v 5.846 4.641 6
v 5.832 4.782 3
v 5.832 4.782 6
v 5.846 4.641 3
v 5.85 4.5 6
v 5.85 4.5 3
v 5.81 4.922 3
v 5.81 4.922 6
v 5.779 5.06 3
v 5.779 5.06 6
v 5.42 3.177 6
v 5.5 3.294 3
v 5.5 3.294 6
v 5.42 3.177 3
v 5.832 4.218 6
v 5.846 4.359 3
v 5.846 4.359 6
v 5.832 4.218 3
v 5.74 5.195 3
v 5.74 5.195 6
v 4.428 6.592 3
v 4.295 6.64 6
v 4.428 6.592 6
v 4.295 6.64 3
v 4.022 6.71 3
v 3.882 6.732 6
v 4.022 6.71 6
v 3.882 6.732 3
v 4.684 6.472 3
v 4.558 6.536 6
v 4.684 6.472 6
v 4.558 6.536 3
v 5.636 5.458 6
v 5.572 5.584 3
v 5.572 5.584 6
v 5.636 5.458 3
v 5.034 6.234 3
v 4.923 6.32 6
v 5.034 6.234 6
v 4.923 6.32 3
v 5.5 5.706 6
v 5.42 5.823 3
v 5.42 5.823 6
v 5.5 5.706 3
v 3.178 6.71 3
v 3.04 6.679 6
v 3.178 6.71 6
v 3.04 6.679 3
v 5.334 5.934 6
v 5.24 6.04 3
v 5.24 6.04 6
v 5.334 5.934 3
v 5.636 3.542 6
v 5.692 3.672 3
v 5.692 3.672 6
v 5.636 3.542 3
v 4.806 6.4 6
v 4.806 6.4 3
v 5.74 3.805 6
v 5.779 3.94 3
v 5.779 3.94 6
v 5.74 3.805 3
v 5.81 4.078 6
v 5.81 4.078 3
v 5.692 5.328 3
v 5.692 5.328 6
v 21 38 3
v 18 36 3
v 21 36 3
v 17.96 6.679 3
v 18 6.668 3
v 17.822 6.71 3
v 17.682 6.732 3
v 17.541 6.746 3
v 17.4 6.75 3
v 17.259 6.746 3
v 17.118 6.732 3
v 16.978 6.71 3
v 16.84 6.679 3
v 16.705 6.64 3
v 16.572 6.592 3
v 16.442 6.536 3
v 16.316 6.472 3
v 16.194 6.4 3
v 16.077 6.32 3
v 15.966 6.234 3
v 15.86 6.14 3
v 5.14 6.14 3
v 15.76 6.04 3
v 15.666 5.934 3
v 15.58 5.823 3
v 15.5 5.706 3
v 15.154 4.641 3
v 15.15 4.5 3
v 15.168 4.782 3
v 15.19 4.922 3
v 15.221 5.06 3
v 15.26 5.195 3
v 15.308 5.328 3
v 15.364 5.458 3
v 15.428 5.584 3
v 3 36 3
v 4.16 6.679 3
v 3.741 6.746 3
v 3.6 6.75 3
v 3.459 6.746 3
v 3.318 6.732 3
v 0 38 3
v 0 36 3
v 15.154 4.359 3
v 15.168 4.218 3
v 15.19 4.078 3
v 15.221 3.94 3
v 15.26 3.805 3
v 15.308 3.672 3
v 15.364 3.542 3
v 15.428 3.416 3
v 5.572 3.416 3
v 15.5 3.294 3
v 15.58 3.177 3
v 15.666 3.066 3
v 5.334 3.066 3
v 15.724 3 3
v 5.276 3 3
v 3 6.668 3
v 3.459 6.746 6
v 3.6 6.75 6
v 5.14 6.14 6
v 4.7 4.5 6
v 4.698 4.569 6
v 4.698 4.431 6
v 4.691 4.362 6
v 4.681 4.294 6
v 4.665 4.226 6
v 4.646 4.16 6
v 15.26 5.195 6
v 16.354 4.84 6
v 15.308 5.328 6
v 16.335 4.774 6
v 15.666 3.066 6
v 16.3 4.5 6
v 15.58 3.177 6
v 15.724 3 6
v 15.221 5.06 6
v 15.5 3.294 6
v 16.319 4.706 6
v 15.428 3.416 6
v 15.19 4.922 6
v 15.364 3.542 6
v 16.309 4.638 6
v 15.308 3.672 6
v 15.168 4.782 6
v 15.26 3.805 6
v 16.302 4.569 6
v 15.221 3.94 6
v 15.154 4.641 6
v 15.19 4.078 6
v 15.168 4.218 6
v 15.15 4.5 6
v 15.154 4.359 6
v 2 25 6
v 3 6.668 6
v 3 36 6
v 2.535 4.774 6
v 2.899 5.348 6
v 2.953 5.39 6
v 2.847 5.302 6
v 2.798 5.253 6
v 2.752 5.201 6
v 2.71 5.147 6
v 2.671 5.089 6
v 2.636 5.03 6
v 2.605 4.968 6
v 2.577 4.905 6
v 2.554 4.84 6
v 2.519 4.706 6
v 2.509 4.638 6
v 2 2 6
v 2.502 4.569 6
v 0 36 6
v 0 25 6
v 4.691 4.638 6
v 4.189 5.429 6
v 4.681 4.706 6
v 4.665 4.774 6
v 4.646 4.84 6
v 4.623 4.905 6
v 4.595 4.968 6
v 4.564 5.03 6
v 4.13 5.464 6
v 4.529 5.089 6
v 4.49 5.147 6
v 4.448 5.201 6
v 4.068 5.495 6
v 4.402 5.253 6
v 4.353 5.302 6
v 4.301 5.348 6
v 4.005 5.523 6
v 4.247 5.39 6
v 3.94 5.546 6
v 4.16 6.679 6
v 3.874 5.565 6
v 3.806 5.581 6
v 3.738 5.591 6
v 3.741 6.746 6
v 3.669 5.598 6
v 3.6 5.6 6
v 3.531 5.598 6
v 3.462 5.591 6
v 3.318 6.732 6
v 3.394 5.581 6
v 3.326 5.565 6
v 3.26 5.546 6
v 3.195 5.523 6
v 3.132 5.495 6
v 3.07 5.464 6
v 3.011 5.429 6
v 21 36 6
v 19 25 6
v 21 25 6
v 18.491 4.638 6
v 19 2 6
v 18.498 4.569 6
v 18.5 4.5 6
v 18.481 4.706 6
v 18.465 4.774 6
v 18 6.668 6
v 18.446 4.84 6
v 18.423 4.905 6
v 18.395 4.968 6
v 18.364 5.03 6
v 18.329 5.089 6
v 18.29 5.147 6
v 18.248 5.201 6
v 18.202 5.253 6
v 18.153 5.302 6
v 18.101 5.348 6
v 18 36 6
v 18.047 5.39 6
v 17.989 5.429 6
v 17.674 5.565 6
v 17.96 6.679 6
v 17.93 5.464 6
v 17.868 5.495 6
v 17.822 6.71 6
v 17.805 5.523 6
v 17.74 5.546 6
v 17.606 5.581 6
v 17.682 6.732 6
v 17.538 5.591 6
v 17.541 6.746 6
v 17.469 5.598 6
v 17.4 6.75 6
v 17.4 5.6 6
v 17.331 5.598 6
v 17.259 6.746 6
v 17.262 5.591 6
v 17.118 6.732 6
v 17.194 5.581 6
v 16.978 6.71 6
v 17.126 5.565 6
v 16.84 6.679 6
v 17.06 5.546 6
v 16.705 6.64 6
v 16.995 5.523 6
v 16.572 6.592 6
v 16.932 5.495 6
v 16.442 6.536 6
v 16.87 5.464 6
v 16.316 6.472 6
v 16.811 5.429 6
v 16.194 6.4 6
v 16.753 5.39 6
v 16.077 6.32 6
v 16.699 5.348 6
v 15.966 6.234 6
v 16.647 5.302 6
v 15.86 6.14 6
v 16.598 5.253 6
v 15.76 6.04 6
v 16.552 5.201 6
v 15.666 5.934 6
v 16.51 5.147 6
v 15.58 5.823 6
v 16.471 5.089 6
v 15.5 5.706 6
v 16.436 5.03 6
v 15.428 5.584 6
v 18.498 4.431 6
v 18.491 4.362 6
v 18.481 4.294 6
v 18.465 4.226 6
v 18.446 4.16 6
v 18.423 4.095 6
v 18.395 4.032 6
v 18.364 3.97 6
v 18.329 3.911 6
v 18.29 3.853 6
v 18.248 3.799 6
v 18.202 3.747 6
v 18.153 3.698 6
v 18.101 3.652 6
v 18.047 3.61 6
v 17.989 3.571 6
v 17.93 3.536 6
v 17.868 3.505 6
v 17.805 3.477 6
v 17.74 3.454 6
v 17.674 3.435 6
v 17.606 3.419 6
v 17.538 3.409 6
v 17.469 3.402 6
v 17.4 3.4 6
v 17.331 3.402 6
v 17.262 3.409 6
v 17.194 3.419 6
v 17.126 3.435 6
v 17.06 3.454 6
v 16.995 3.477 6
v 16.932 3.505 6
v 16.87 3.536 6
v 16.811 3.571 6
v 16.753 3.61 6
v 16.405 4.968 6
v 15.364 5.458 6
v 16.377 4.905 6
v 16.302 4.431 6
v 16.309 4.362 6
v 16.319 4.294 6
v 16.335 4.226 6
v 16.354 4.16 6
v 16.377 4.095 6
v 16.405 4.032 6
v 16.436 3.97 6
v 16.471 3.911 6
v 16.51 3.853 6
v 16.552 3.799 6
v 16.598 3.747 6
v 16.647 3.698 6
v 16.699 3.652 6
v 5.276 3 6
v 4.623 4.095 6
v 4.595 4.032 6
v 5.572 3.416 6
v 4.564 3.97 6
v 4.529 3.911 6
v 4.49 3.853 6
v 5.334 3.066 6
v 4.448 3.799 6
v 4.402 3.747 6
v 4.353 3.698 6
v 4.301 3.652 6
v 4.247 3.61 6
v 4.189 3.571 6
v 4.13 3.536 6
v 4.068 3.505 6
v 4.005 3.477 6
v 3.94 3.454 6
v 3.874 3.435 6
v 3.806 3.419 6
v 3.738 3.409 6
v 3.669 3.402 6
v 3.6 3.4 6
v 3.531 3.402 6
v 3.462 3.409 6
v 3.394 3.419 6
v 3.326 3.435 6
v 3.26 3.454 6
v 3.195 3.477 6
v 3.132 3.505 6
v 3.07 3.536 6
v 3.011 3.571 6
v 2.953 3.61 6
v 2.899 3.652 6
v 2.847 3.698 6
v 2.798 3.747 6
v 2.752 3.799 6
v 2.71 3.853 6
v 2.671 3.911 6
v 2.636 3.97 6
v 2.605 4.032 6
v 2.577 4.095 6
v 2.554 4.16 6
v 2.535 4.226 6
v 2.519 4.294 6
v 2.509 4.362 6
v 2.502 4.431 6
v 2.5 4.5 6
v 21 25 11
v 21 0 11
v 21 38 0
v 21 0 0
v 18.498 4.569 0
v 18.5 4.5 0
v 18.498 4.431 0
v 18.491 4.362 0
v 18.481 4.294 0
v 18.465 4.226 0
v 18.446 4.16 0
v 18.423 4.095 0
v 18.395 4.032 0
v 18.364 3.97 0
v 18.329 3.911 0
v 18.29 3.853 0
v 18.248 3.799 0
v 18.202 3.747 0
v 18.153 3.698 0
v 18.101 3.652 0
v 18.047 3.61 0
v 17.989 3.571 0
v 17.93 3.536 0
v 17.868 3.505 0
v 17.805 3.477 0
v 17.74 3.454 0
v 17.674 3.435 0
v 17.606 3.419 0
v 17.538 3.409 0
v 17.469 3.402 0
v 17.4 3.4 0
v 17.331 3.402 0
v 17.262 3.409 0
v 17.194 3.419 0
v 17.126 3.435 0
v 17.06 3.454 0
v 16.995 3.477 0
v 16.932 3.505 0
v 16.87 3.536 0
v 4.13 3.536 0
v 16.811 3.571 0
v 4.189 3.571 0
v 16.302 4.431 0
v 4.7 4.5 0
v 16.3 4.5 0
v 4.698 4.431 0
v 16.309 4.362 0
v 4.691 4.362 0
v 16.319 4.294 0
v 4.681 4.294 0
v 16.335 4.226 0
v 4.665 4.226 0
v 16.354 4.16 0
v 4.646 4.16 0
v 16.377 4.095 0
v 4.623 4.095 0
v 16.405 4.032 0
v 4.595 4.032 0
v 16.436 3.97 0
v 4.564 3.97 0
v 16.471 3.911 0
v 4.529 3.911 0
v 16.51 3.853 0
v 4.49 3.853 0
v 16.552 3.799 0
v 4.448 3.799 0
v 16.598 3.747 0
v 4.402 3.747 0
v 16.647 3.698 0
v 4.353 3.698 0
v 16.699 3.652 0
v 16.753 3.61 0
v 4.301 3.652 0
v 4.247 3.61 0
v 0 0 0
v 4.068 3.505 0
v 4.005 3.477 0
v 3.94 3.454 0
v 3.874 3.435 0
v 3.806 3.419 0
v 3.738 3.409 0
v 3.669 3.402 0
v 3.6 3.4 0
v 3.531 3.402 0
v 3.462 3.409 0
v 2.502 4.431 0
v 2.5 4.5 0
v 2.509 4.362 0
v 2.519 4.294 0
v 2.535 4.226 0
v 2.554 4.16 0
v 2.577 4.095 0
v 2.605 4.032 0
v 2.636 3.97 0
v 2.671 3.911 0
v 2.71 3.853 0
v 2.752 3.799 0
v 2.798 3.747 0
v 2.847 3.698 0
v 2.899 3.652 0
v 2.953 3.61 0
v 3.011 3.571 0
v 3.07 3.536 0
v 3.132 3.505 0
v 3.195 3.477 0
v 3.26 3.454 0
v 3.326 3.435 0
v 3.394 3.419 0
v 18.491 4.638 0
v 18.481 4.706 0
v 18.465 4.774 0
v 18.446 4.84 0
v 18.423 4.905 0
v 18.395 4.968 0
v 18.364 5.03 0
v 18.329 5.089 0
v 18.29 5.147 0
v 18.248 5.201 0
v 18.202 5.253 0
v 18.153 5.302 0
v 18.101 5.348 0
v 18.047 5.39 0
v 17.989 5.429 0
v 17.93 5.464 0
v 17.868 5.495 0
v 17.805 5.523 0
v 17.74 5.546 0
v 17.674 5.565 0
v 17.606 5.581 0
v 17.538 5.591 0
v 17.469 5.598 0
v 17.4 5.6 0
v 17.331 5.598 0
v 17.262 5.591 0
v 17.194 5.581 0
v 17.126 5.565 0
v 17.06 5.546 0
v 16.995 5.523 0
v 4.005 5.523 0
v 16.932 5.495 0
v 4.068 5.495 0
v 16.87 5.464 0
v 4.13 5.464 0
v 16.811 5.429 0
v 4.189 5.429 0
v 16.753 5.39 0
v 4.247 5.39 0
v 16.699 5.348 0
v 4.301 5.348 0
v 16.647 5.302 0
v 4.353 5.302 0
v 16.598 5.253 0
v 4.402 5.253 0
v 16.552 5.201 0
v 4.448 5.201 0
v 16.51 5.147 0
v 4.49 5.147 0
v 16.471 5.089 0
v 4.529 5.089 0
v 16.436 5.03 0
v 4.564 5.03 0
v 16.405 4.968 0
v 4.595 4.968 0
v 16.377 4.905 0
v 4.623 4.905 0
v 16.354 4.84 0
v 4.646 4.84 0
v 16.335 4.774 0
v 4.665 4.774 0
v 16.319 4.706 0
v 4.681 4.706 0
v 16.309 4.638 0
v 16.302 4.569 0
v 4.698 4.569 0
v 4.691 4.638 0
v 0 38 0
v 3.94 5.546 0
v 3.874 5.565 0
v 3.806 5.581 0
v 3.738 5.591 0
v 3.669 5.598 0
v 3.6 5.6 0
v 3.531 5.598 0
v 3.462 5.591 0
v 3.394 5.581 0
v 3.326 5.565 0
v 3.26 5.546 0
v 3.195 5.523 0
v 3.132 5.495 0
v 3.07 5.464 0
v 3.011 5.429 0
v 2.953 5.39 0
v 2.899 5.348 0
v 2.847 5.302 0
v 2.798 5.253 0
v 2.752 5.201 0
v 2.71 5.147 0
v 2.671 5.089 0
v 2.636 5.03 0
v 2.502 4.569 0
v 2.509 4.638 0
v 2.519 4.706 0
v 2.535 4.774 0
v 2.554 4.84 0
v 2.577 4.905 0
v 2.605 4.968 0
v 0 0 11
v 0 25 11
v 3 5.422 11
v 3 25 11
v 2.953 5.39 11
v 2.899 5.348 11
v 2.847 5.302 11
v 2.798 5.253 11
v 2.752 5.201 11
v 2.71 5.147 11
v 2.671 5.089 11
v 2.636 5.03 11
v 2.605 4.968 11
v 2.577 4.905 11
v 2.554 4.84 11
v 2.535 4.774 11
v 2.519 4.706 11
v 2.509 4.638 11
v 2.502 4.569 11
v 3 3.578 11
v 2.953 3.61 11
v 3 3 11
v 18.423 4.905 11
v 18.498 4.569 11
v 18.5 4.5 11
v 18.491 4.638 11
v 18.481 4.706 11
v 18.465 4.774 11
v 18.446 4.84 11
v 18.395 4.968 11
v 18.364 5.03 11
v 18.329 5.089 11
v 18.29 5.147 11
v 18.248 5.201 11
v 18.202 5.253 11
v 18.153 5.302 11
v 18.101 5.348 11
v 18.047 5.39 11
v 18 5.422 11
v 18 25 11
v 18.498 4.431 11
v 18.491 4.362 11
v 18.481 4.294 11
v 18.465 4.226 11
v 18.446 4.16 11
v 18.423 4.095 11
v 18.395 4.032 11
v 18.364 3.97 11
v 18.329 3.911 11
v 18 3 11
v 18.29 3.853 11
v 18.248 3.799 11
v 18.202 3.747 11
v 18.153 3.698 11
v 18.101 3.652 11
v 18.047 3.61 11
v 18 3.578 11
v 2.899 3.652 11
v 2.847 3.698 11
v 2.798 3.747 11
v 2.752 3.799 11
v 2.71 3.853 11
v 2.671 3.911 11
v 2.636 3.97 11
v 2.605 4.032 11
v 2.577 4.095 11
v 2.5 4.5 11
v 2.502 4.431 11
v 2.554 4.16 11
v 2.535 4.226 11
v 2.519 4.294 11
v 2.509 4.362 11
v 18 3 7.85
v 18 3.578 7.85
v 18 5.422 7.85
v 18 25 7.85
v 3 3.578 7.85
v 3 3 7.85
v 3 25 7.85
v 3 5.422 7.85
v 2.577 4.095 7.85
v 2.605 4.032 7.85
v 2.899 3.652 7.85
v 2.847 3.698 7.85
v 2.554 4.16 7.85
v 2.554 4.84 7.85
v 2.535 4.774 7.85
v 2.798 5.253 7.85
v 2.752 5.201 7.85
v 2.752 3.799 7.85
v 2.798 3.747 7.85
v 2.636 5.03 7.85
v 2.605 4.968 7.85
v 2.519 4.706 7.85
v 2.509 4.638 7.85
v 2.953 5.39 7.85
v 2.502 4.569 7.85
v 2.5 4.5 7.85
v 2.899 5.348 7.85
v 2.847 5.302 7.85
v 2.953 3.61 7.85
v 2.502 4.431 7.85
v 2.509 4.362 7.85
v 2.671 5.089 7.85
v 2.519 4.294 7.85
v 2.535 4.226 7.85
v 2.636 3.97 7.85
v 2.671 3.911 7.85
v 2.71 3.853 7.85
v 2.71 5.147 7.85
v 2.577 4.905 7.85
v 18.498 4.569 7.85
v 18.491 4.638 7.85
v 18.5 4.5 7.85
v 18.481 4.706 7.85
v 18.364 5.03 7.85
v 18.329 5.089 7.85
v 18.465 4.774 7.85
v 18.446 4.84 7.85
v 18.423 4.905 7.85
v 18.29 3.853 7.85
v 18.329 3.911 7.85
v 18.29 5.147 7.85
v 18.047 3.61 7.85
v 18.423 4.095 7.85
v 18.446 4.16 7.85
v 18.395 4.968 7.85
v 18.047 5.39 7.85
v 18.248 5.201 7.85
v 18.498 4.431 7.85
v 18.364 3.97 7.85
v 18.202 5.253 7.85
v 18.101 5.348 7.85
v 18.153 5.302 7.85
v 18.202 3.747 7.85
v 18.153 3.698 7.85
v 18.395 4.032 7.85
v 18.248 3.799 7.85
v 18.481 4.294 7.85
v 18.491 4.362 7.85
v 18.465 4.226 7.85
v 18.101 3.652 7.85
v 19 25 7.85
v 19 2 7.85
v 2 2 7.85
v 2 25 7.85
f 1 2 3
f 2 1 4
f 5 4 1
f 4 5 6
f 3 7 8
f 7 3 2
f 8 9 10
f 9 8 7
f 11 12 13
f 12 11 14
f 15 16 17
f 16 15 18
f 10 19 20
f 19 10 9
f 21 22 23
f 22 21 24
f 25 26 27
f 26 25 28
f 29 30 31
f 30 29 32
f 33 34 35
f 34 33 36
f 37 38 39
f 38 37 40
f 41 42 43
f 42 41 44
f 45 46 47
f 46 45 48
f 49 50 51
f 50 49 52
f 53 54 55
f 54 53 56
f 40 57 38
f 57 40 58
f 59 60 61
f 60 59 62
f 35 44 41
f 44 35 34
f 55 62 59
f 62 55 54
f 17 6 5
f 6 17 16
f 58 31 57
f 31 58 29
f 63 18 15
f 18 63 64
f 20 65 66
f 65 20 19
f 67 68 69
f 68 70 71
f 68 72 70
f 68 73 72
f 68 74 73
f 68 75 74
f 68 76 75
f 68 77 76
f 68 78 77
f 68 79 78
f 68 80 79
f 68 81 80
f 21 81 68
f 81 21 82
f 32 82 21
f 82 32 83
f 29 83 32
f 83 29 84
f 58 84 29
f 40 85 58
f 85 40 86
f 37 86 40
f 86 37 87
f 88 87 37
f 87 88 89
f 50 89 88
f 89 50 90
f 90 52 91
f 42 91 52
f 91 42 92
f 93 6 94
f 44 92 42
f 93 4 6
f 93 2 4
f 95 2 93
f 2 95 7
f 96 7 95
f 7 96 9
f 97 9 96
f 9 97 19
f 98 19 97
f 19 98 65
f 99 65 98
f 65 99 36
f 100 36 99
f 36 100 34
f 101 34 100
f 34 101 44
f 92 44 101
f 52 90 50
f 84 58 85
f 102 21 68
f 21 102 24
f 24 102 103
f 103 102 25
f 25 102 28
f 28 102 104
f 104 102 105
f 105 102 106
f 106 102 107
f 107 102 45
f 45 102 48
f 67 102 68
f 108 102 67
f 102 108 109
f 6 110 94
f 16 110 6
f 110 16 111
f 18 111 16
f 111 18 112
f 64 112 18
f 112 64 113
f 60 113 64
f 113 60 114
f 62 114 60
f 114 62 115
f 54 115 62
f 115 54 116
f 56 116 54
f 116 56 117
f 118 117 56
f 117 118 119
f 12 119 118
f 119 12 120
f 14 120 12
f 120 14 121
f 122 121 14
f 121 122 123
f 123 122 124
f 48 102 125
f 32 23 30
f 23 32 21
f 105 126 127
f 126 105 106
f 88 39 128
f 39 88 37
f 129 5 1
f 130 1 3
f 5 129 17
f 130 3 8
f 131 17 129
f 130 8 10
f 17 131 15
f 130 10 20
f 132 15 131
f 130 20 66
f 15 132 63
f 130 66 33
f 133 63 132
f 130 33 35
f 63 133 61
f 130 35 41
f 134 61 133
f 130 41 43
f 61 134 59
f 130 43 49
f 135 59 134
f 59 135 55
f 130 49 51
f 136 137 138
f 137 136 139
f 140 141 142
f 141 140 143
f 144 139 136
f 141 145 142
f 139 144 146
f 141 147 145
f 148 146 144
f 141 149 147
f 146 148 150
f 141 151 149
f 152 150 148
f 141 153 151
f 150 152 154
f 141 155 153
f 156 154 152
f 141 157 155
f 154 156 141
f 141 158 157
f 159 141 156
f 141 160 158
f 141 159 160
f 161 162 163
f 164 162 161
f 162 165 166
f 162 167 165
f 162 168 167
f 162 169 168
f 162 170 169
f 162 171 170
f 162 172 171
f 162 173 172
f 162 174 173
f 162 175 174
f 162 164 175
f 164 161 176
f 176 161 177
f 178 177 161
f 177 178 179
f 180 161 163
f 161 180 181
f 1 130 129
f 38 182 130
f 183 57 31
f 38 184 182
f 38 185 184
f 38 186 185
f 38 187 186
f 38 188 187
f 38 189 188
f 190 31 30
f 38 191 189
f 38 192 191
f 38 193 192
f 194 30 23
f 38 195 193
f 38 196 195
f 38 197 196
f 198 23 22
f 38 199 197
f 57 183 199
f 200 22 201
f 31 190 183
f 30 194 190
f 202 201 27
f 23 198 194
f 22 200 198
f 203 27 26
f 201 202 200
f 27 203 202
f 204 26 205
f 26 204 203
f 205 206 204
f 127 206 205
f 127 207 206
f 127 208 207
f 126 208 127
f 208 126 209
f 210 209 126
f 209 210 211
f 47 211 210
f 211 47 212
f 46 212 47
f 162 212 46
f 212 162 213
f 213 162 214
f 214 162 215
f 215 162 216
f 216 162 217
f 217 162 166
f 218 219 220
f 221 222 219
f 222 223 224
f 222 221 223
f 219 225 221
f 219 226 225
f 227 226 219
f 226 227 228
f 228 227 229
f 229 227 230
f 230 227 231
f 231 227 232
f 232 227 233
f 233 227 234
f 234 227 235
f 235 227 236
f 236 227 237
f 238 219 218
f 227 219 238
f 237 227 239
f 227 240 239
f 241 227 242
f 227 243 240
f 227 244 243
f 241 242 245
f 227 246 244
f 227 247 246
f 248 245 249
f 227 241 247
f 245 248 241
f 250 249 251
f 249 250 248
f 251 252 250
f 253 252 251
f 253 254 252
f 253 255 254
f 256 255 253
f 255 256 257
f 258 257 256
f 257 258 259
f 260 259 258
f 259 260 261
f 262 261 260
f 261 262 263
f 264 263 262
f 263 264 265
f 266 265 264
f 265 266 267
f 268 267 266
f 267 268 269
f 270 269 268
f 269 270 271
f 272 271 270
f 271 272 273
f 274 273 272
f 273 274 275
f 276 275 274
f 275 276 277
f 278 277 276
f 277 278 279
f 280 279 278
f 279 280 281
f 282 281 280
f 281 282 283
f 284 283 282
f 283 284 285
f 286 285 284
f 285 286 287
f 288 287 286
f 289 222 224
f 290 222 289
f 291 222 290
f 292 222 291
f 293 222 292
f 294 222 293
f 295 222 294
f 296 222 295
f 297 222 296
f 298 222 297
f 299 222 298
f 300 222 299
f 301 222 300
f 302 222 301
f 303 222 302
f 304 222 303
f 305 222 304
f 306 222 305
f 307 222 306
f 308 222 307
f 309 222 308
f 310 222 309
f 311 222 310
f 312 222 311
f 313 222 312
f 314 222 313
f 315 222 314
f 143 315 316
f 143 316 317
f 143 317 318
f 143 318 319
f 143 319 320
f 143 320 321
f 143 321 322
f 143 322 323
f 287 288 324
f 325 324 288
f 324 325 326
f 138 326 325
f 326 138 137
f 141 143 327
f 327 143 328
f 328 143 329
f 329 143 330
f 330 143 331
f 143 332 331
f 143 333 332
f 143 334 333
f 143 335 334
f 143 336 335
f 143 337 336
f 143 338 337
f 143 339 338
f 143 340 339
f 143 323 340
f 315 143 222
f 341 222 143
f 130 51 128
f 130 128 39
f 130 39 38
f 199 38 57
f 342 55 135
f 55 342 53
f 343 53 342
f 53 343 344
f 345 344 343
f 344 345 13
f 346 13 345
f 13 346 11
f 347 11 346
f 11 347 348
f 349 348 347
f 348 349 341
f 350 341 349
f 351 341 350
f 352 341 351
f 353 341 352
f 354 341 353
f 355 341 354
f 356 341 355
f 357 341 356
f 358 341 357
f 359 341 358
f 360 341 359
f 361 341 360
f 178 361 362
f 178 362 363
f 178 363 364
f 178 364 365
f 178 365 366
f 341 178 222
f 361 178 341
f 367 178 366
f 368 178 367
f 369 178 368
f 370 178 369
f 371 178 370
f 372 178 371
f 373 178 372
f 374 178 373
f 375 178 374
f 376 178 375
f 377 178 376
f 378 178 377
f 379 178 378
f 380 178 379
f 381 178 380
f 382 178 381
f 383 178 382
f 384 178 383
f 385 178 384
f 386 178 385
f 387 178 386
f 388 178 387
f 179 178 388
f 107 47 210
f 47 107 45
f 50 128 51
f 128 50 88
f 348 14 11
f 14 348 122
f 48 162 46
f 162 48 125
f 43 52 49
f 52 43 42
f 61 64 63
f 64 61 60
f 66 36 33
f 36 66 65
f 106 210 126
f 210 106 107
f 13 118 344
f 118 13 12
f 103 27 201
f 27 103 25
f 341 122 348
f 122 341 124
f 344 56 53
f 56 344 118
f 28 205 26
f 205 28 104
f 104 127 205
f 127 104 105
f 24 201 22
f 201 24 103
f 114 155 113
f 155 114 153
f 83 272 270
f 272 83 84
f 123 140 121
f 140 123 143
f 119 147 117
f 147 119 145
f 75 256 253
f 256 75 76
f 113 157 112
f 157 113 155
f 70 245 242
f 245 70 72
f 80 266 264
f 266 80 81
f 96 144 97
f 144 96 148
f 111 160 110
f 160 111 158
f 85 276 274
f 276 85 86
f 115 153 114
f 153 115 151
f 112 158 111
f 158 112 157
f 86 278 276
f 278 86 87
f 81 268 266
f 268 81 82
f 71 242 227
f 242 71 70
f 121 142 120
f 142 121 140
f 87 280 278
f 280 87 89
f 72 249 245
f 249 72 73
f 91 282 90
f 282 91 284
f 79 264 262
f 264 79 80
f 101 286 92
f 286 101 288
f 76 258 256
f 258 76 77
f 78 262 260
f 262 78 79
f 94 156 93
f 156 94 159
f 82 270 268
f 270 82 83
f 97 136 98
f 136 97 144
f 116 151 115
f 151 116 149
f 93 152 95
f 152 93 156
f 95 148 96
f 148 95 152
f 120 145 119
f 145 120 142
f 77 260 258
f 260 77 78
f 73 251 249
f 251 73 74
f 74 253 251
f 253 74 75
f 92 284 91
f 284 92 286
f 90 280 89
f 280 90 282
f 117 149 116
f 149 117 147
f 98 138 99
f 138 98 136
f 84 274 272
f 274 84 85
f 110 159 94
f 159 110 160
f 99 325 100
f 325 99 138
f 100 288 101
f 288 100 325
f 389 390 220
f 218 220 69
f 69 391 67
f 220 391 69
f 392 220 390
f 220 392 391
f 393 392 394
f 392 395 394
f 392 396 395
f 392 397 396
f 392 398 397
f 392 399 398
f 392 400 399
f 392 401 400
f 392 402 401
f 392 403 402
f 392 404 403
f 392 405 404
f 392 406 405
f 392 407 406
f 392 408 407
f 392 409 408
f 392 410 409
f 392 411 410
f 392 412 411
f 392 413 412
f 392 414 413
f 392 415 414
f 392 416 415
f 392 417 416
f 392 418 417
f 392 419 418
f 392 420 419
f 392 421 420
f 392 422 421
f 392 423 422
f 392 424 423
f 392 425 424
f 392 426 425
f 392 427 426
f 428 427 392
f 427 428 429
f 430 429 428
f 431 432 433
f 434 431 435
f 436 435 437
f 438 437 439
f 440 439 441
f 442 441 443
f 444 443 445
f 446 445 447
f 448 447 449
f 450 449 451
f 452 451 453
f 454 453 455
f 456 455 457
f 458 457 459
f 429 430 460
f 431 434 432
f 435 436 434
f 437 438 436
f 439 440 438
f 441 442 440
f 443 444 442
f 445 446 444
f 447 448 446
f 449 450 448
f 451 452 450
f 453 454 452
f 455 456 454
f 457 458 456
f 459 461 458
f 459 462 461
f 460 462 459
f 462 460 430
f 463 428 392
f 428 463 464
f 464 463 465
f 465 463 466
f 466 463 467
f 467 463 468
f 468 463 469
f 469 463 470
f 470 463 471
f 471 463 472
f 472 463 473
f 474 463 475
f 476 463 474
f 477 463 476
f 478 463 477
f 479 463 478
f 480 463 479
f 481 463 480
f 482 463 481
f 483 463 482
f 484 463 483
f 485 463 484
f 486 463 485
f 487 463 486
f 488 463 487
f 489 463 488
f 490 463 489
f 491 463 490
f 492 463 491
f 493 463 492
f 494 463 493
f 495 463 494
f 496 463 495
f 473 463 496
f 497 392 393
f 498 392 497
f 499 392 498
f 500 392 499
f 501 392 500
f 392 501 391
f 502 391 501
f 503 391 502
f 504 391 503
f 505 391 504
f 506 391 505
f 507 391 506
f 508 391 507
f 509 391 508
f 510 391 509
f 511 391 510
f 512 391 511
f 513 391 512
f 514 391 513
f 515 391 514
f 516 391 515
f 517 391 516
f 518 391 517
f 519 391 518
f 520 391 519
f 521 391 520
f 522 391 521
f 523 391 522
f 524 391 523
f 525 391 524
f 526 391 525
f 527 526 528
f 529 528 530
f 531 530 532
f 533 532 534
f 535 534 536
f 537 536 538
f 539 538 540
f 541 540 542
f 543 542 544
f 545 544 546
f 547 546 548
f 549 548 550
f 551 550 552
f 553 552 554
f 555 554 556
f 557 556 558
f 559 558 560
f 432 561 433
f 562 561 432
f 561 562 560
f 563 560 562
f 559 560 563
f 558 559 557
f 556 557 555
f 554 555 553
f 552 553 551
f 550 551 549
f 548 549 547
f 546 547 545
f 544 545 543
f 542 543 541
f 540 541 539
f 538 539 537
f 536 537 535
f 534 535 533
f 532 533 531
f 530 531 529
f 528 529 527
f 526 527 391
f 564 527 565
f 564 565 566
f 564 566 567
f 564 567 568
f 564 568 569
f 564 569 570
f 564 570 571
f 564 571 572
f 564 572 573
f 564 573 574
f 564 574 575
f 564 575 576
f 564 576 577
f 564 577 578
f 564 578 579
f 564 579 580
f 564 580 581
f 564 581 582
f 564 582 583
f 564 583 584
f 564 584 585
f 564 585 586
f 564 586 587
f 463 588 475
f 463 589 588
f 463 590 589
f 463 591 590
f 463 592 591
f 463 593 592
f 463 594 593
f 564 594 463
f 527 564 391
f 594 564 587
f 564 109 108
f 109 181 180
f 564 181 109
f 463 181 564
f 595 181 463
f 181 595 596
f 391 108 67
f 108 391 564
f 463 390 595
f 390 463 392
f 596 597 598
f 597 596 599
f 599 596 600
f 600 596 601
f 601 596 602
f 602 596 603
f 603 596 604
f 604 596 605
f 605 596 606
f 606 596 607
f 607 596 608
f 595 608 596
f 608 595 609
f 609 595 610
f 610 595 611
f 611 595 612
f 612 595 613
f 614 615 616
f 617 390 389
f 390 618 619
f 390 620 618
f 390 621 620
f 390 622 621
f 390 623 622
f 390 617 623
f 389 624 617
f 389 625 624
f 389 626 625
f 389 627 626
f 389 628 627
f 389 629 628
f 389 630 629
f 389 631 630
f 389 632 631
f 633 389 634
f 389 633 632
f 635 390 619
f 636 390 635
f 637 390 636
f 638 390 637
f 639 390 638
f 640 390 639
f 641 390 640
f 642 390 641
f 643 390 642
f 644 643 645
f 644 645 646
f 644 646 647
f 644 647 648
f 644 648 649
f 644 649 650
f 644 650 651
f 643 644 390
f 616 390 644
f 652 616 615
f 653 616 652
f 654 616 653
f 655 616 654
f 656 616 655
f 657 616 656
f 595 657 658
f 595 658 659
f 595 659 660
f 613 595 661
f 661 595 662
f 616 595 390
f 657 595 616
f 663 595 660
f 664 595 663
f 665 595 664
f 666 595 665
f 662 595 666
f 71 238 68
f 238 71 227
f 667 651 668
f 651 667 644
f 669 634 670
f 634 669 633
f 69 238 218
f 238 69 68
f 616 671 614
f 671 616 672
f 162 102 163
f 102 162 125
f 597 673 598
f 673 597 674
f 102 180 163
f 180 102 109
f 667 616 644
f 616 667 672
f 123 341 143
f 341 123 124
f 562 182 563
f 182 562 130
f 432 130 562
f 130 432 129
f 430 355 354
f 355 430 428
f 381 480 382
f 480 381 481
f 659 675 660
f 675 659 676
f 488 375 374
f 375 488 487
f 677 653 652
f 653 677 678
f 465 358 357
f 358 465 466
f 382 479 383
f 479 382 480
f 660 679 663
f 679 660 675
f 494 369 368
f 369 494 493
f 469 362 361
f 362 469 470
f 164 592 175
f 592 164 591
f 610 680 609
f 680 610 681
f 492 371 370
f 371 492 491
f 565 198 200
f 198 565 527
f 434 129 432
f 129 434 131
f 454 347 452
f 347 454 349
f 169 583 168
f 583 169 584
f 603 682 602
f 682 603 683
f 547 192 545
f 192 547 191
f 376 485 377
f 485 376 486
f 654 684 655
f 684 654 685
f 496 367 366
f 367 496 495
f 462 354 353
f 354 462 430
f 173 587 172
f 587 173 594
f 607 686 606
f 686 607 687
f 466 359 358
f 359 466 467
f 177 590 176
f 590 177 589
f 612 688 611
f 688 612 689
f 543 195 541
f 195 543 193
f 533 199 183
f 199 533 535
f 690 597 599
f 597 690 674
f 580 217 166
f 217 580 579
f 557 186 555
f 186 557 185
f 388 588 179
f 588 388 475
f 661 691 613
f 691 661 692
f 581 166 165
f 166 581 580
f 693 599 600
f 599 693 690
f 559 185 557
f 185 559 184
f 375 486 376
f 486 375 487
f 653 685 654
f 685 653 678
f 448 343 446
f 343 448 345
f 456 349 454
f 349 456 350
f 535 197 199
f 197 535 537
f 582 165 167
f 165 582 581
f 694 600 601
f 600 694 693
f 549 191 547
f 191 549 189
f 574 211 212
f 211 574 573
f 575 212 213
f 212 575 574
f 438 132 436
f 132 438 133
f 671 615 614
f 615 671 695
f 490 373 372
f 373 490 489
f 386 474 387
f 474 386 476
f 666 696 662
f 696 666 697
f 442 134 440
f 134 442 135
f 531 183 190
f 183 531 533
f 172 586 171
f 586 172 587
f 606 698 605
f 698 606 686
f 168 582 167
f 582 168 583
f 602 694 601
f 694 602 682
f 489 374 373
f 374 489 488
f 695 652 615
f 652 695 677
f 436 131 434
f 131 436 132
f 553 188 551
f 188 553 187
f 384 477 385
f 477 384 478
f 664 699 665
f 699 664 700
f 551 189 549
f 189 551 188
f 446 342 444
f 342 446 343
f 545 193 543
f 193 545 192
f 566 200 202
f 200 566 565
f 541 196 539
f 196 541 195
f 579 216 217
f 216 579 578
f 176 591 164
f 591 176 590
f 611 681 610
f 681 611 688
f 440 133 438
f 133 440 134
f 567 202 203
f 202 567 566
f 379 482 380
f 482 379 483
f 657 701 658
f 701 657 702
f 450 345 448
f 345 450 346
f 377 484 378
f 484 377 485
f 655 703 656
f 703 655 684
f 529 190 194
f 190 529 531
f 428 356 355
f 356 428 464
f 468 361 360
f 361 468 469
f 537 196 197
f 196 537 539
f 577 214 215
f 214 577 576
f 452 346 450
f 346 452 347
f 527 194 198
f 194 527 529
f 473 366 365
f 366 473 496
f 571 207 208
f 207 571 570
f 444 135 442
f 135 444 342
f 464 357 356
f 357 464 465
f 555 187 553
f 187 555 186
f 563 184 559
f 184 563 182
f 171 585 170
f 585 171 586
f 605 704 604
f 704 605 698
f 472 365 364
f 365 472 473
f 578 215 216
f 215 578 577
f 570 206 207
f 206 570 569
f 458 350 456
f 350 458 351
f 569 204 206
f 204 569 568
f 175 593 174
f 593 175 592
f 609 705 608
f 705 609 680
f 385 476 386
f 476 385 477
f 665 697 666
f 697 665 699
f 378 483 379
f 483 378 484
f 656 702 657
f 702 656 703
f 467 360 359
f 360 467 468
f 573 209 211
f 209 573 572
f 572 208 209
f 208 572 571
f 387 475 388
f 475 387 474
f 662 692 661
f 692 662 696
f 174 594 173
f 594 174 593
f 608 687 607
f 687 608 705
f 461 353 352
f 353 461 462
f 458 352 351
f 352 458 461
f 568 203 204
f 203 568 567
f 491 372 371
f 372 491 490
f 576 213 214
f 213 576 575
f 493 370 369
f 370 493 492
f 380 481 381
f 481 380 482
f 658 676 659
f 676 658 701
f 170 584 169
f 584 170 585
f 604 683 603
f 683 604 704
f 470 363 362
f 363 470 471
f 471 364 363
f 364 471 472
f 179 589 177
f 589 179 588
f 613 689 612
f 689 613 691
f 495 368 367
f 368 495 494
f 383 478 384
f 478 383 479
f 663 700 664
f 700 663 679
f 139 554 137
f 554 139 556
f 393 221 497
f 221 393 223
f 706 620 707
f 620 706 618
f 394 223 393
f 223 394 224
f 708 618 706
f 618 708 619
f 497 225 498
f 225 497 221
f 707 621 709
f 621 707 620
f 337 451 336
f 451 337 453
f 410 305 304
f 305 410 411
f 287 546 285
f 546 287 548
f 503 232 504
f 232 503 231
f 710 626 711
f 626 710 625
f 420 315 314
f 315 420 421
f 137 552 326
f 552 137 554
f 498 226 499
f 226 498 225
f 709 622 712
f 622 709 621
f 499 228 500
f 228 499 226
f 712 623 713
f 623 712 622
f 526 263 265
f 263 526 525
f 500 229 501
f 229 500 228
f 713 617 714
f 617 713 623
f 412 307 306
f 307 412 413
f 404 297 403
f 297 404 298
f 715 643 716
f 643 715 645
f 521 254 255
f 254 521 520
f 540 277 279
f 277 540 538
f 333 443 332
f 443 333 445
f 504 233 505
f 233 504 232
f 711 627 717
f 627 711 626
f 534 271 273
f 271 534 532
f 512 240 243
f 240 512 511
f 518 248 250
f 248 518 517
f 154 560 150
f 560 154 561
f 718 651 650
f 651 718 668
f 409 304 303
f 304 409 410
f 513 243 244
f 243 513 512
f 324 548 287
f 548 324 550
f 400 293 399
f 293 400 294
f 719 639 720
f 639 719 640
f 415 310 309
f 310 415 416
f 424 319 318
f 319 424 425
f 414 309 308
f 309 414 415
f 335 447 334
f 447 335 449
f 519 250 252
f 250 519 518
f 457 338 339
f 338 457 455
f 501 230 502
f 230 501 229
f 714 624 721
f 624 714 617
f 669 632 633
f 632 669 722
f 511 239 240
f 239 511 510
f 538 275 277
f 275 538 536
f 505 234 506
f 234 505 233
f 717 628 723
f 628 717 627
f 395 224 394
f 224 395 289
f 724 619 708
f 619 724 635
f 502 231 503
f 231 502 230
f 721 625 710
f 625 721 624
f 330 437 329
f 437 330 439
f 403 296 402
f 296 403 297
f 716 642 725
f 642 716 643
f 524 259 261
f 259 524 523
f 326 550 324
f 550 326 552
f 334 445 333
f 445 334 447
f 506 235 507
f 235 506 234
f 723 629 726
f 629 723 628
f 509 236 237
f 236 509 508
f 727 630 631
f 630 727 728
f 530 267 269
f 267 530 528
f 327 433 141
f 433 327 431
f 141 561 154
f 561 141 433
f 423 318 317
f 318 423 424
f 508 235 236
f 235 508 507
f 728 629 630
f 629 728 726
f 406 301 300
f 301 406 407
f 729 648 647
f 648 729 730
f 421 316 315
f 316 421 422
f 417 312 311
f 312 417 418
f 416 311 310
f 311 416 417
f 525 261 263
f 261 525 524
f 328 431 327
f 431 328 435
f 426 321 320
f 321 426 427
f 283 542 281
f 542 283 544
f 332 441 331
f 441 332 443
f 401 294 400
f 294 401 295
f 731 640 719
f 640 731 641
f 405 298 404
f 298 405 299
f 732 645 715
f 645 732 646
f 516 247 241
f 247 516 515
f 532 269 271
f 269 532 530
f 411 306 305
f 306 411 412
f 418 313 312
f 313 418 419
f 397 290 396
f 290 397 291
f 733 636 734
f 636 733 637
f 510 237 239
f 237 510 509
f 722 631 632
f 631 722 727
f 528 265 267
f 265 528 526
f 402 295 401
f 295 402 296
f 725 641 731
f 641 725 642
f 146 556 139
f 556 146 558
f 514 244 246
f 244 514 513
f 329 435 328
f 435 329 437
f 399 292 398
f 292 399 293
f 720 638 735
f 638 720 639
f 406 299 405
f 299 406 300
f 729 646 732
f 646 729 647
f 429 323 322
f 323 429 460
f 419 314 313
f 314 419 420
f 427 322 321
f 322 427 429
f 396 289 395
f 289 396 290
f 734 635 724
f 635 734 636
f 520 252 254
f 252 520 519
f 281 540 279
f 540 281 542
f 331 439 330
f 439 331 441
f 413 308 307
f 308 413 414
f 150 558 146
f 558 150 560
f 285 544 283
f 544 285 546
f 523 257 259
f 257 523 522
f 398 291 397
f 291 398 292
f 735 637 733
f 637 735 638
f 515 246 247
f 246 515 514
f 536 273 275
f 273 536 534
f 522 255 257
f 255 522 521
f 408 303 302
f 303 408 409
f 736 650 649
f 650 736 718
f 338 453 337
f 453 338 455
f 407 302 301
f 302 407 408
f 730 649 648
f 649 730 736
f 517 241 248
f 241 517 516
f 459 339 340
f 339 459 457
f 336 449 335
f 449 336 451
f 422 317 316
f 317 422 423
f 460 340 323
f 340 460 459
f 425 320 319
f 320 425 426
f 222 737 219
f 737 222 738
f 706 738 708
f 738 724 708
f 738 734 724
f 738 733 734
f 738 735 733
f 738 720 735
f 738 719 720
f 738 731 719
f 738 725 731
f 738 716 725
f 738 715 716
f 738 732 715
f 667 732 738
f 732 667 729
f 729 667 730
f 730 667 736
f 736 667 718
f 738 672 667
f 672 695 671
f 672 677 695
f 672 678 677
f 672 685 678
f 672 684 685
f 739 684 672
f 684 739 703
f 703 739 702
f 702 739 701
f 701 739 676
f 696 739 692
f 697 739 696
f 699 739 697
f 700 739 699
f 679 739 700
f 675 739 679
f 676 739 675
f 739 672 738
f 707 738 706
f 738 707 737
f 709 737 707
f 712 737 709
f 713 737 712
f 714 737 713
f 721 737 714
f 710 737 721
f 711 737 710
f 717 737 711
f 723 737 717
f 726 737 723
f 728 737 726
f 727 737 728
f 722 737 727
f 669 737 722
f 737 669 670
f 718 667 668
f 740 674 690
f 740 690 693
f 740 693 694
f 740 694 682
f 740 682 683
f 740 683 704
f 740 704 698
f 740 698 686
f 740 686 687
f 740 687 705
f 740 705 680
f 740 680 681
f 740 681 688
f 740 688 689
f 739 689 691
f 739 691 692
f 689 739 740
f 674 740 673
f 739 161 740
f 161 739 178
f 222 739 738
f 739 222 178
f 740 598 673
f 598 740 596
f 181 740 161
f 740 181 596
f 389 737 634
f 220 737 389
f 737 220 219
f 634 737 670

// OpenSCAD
// file: PCBMount.scad
$fn = 100; // Resolution for circles






module PCBMount(pcb_width=10, pcb_depth=10,pcb_thickness=1.6, pcbmounting_holes, leftWall, rightWall, frontWall, backWall,pcb_mounting_holes  ){
    // Mount parameters
    base_thickness = 3;
    wall_height = 8;
    wall_thickness = 2;
    clearance = 0.3; // For easier fitting
    
    // Mounting post parameters
    post_height = 3;
    post_outer_diameter = 4.5;
    post_inner_diameter = 2.2; // Slightly smaller than 2.5mm hole for press fit
   
     
    difference() {
    difference() {
        union() {
            
            for (hole = pcb_mounting_holes){
                translate([wall_thickness  + hole[0],wall_thickness + 1 + hole[1],base_thickness]){
                cylinder(h = post_height,d = post_outer_diameter);
                }
                
            }
            
            // Base plate
            color("lightblue", 0.8)
            cube([pcb_width + wall_thickness * 2, 
                  pcb_depth + wall_thickness * 2, 
                  base_thickness]);
            if (rightWall){
            // Right wall 
            translate([pcb_width + wall_thickness -1, wall_thickness, 0])
                color("lightblue", 0.8)
                cube([wall_thickness + 1, pcb_depth, base_thickness + wall_height]);
            }
            
            
            if (leftWall){
            // Left wall 
            translate([0, wall_thickness, 0])
                color("lightblue", 0.8)
                cube([wall_thickness + 1, pcb_depth, base_thickness + wall_height]);
            }

            if (frontWall){
            // front wall
            translate([0, 0, 0])
                color("lightblue", 0.8)
                cube([pcb_width + wall_thickness * 2, wall_thickness+ 1, base_thickness + wall_height]);
            }
                
            if (backWall){
                        // back wall
            translate([0, pcb_depth + wall_thickness -1, 0])
                color("lightblue", 0.8)
                cube([pcb_width + wall_thickness * 2, wall_thickness+ 1, base_thickness + wall_height]);
            }

        }
           union(){
                        for (hole = pcb_mounting_holes){
                translate([wall_thickness  + hole[0],wall_thickness + 1 + hole[1],-0.1]){
                cylinder(h = base_thickness + wall_height +0.2,d = post_inner_diameter);
                }
                
            }
        }
    }
    translate([wall_thickness, wall_thickness, base_thickness + post_height]){
    cube([pcb_width,pcb_depth + 1,pcb_thickness + 0.25]);
    }
    }
   
}
// main file
use <PCBMount.scad>

difference(){
PCBMount(
    pcb_width = 17,
    pcb_depth = 34,
    pcb_thickness = 1.6,
    pcb_mounting_holes = [
        [1.6,1.5],[15.4,1.5]
    ],
    leftWall = true,
    rightWall = true,
    backWall = false,
    frontWall = true


);
translate([-1,25,6]){
    cube([1000,15,1000]);
};

}
